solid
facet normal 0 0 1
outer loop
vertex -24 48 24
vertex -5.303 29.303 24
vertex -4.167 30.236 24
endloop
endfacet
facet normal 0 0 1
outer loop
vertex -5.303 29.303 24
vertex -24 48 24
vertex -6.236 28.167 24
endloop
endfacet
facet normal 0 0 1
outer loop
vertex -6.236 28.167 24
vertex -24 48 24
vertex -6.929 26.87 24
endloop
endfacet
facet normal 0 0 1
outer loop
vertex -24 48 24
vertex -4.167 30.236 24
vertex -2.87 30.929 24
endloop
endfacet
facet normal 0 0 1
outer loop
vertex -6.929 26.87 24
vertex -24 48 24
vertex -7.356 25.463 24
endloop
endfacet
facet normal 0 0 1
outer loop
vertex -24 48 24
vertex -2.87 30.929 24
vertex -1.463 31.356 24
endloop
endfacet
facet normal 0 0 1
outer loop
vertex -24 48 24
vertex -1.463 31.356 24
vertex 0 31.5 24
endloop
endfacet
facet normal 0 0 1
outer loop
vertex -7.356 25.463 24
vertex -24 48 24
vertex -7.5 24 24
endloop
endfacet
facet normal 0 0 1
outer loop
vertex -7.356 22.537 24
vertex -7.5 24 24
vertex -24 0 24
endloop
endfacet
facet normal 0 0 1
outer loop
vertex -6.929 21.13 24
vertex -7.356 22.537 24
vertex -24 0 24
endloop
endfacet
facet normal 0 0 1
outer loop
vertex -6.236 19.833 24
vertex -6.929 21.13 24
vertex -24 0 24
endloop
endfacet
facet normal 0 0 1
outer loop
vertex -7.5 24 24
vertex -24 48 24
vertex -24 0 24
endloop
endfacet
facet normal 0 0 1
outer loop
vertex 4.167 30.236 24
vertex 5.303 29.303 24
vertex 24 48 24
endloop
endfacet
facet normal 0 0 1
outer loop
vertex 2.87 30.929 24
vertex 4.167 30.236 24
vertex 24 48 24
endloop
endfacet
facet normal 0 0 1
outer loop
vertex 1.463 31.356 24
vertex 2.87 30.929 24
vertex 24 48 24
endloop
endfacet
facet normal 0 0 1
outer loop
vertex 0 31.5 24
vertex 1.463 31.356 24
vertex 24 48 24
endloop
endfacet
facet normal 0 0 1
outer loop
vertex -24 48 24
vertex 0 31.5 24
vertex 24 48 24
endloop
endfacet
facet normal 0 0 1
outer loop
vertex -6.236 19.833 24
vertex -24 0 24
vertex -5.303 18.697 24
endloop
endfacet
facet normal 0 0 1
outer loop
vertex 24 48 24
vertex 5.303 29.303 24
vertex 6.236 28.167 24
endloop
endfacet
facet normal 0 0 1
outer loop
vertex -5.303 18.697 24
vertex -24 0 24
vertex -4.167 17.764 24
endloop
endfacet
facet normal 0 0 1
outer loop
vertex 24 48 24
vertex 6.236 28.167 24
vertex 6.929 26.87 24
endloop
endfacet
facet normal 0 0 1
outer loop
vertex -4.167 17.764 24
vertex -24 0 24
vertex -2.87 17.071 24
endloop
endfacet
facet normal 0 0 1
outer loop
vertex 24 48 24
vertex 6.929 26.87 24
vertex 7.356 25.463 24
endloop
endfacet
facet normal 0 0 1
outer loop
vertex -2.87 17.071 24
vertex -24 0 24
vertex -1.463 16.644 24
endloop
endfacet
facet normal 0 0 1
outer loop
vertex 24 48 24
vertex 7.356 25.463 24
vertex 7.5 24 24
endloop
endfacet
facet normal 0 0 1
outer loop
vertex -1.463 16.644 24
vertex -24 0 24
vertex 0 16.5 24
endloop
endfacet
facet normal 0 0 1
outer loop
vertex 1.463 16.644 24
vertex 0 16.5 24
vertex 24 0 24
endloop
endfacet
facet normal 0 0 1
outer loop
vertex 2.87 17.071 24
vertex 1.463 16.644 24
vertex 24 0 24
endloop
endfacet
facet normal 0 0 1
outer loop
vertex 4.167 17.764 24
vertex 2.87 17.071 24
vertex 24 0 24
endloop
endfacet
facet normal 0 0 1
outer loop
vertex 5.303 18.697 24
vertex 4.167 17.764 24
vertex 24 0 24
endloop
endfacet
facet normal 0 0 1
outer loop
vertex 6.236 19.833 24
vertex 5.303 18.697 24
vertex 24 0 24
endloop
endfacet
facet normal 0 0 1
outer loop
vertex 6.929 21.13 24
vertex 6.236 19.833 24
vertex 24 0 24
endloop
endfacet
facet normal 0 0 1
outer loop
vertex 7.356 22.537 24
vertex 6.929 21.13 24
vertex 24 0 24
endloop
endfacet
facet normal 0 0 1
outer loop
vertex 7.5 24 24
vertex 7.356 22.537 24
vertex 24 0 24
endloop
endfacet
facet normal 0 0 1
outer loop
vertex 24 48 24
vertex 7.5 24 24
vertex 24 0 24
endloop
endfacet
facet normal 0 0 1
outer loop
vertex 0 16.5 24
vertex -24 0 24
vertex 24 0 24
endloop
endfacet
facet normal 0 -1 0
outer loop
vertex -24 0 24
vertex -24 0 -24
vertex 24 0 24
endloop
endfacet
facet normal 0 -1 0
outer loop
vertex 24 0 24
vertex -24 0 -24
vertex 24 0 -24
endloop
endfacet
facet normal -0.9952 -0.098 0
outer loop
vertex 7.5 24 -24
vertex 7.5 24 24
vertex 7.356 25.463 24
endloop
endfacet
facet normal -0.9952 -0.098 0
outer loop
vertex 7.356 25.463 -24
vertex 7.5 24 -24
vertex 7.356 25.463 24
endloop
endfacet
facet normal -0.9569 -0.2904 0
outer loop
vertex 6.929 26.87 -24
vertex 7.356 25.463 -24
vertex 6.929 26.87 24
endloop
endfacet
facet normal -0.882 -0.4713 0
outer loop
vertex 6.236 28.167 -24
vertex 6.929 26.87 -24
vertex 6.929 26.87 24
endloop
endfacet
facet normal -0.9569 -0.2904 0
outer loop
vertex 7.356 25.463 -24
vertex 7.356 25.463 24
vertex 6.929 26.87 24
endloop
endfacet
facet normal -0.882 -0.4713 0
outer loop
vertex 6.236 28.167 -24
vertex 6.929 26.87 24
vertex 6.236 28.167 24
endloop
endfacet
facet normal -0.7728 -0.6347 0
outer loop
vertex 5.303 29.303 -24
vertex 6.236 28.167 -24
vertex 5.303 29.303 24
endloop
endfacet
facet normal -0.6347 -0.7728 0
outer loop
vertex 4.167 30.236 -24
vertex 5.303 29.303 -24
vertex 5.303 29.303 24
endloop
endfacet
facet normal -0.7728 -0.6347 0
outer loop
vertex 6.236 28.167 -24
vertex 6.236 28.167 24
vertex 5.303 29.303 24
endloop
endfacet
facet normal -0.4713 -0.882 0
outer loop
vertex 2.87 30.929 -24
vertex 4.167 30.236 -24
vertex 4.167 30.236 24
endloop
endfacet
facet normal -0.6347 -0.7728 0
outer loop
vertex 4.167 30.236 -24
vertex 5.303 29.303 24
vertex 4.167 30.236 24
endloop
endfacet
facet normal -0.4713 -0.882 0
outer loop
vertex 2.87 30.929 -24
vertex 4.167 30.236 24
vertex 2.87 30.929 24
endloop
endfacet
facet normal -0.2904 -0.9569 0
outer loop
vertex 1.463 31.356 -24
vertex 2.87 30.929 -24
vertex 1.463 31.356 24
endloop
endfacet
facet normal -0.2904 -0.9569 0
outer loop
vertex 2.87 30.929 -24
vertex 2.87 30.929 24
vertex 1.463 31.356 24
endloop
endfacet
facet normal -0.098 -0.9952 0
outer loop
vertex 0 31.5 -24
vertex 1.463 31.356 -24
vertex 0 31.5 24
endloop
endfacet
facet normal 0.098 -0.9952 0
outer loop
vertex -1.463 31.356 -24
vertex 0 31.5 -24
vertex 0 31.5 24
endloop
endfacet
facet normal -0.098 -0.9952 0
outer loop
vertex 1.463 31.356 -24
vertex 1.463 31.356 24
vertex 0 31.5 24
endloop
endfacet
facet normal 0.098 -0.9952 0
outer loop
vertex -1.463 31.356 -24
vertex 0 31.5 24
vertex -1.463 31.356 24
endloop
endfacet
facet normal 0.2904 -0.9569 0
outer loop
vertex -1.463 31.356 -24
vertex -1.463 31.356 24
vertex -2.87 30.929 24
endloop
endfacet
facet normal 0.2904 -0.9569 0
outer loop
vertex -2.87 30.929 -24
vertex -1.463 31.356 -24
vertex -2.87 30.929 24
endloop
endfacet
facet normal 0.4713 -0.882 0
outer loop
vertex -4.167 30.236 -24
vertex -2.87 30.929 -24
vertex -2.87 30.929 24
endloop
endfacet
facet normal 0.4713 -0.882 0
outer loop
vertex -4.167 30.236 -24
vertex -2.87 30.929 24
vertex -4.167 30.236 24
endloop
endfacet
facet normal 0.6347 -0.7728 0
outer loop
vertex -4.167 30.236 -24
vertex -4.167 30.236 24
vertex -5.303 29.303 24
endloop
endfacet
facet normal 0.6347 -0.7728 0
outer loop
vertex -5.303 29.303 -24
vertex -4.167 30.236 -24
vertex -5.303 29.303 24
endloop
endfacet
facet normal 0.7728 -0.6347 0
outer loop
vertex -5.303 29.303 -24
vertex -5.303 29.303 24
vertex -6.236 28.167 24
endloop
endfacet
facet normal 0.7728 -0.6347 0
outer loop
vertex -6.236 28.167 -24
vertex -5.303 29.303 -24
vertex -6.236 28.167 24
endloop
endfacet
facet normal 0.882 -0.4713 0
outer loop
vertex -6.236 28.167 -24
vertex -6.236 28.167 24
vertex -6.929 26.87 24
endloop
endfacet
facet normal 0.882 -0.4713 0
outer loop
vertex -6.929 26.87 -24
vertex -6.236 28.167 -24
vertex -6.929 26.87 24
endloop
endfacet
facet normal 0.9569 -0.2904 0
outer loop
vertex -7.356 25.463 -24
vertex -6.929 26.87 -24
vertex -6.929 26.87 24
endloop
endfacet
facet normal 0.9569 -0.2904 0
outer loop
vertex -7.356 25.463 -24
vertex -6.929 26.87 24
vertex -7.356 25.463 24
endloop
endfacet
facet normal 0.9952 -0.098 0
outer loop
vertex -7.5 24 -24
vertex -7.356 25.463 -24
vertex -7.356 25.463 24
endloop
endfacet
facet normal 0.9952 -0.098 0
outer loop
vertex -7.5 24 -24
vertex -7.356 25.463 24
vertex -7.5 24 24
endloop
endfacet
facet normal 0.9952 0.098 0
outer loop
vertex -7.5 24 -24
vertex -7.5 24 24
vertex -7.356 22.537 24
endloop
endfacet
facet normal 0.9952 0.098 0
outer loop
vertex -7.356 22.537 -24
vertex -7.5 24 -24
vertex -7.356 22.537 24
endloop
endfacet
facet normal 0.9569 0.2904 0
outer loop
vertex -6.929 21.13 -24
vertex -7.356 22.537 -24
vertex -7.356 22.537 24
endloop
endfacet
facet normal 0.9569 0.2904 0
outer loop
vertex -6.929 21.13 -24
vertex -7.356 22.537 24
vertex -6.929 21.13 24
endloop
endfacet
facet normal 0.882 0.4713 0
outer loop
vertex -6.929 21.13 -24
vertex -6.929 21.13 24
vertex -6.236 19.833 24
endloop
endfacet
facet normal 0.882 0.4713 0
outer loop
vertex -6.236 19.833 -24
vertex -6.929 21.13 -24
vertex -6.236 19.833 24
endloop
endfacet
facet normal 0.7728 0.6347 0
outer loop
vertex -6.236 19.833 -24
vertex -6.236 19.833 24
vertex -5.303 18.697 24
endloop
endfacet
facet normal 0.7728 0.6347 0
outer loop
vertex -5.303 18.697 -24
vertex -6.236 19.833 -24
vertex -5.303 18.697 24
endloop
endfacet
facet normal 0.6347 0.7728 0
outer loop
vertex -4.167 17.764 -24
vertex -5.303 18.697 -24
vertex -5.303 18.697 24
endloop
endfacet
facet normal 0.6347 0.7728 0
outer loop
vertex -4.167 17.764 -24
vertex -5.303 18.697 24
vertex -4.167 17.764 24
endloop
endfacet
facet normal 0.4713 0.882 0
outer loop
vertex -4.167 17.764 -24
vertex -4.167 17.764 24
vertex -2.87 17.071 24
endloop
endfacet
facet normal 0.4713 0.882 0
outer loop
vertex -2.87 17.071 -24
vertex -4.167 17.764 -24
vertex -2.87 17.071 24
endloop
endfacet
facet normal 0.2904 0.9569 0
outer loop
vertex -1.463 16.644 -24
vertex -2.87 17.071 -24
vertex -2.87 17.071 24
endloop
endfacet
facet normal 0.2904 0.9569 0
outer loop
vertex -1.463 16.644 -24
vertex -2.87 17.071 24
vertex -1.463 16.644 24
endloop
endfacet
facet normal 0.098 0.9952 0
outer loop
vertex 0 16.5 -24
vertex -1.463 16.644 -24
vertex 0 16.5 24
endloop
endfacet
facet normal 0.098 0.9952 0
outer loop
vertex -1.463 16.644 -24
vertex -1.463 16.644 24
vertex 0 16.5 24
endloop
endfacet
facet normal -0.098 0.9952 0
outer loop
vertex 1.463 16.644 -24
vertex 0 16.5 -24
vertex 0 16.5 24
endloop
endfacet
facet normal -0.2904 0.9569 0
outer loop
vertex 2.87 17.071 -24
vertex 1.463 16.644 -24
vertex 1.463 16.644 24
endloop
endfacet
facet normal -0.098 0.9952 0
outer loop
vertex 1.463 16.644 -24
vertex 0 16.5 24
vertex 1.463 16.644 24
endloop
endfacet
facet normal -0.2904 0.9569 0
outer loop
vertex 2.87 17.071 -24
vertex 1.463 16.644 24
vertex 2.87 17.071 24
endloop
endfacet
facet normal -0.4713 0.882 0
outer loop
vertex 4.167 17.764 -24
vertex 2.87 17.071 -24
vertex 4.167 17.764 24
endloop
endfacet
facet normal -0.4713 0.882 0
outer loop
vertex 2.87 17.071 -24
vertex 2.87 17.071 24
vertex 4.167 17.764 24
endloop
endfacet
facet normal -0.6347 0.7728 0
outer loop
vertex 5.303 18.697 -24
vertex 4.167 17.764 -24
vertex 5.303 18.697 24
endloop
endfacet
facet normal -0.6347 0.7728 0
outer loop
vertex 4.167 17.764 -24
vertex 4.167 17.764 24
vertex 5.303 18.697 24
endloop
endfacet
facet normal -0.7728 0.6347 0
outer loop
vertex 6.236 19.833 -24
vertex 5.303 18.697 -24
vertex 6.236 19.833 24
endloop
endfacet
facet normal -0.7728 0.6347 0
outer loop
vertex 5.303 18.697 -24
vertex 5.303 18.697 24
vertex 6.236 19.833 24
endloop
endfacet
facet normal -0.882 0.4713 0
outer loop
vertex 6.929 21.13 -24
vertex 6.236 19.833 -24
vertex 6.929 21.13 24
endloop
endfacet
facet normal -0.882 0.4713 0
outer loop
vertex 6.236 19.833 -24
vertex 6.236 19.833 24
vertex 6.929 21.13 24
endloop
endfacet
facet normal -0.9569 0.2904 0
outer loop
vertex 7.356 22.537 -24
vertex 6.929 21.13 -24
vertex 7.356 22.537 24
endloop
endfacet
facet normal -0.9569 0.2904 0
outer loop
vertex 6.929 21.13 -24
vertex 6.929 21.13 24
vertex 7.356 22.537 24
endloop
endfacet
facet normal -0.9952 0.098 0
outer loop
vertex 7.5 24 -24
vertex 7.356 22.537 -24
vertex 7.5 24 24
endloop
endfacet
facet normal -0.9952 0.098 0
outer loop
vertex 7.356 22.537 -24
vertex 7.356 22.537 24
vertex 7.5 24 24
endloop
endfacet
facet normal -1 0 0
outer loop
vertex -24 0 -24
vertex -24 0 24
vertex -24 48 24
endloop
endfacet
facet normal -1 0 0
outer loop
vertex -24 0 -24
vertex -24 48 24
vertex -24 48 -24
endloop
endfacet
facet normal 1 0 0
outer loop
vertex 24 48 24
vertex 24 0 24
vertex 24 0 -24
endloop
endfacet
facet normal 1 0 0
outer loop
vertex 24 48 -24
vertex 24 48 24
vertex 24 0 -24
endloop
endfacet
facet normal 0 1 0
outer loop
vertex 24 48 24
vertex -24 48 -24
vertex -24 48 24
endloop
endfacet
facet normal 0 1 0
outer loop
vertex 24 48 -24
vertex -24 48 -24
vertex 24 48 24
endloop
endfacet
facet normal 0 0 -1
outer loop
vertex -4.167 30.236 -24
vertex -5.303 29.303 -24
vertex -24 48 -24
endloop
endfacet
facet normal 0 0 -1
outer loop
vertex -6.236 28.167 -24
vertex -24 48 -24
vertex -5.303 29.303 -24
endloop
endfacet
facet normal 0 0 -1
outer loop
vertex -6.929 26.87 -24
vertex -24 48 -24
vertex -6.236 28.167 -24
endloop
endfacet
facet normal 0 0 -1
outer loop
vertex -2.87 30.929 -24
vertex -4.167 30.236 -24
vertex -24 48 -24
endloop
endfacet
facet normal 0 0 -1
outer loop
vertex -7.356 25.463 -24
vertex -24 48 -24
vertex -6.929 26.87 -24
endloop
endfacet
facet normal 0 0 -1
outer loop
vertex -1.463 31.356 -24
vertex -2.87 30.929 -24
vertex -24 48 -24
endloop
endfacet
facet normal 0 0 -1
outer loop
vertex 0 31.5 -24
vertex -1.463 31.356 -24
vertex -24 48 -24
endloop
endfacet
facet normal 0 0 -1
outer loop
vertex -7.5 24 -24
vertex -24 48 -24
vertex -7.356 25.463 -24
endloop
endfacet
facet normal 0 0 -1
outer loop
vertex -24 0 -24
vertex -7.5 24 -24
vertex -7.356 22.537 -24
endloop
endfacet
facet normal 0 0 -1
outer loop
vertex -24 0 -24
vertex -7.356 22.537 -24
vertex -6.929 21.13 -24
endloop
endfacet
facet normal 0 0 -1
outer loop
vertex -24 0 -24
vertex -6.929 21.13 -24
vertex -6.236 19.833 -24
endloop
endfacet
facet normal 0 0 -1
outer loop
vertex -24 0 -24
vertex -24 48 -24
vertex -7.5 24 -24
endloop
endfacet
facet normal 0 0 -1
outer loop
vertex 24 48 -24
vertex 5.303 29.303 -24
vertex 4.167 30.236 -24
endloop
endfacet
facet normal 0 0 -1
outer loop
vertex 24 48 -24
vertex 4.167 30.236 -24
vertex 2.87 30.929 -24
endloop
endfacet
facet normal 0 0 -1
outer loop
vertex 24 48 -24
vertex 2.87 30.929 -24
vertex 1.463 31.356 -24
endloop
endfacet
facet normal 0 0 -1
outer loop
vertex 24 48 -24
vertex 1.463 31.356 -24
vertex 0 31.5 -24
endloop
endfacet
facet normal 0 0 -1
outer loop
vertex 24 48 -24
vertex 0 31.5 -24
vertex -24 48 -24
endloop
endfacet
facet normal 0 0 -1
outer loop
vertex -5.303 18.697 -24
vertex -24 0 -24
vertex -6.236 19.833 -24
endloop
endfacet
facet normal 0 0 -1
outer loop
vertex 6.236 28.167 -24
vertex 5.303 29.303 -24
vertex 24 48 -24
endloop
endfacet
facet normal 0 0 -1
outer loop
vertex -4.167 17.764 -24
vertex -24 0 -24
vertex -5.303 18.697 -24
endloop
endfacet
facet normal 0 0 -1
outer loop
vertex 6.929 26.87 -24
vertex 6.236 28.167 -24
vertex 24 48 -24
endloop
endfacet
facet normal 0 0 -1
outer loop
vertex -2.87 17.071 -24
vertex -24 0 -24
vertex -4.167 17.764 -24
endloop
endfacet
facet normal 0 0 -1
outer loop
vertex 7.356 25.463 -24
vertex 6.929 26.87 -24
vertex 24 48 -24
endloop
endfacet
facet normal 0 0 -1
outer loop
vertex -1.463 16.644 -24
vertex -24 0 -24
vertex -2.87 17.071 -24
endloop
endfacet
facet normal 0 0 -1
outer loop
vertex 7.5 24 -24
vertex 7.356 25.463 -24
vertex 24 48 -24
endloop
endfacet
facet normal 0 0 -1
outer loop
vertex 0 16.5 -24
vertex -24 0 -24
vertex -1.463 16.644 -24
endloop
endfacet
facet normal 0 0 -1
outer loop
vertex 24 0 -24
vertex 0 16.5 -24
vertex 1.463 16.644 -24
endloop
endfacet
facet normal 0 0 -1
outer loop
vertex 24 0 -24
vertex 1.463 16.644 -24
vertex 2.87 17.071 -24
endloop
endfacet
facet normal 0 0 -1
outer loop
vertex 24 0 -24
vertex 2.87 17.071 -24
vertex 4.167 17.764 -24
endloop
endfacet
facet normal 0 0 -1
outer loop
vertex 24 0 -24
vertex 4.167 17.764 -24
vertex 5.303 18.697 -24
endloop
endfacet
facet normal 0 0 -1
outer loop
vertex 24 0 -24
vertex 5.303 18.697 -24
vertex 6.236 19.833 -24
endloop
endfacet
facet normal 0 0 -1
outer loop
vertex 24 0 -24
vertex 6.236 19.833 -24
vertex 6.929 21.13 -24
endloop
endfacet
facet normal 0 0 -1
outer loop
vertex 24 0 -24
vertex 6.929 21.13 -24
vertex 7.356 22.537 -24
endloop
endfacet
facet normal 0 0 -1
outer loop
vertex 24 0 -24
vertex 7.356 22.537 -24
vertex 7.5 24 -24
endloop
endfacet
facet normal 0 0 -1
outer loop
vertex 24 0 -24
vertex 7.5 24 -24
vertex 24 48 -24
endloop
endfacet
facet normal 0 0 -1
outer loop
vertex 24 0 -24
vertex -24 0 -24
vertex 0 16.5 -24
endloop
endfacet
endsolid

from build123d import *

# Parameters (mm, degrees)
SKETCH1_W           = 48
SKETCH1_H           = 48
BOSS_EXTRUDE1_DEPTH = 48
SKETCH2_R           = 7.5
CUT_EXTRUDE1_DEPTH  = 49


with BuildPart() as part:
    # Sketch1 → Boss-Extrude1 (new body)
    with BuildSketch(Plane(origin=(0, 0, 0), x_dir=(1, 0, 0), z_dir=(0, 1, 0))):
        Rectangle(SKETCH1_W, SKETCH1_H)
    extrude(amount=BOSS_EXTRUDE1_DEPTH)

    # Sketch2 → Cut-Extrude1 (cut, through all)
    with BuildSketch(Plane.XY.offset(24)):
        with Locations((0, 24)):
            Circle(SKETCH2_R)
    extrude(amount=-CUT_EXTRUDE1_DEPTH, mode=Mode.SUBTRACT)


solid = part.part
